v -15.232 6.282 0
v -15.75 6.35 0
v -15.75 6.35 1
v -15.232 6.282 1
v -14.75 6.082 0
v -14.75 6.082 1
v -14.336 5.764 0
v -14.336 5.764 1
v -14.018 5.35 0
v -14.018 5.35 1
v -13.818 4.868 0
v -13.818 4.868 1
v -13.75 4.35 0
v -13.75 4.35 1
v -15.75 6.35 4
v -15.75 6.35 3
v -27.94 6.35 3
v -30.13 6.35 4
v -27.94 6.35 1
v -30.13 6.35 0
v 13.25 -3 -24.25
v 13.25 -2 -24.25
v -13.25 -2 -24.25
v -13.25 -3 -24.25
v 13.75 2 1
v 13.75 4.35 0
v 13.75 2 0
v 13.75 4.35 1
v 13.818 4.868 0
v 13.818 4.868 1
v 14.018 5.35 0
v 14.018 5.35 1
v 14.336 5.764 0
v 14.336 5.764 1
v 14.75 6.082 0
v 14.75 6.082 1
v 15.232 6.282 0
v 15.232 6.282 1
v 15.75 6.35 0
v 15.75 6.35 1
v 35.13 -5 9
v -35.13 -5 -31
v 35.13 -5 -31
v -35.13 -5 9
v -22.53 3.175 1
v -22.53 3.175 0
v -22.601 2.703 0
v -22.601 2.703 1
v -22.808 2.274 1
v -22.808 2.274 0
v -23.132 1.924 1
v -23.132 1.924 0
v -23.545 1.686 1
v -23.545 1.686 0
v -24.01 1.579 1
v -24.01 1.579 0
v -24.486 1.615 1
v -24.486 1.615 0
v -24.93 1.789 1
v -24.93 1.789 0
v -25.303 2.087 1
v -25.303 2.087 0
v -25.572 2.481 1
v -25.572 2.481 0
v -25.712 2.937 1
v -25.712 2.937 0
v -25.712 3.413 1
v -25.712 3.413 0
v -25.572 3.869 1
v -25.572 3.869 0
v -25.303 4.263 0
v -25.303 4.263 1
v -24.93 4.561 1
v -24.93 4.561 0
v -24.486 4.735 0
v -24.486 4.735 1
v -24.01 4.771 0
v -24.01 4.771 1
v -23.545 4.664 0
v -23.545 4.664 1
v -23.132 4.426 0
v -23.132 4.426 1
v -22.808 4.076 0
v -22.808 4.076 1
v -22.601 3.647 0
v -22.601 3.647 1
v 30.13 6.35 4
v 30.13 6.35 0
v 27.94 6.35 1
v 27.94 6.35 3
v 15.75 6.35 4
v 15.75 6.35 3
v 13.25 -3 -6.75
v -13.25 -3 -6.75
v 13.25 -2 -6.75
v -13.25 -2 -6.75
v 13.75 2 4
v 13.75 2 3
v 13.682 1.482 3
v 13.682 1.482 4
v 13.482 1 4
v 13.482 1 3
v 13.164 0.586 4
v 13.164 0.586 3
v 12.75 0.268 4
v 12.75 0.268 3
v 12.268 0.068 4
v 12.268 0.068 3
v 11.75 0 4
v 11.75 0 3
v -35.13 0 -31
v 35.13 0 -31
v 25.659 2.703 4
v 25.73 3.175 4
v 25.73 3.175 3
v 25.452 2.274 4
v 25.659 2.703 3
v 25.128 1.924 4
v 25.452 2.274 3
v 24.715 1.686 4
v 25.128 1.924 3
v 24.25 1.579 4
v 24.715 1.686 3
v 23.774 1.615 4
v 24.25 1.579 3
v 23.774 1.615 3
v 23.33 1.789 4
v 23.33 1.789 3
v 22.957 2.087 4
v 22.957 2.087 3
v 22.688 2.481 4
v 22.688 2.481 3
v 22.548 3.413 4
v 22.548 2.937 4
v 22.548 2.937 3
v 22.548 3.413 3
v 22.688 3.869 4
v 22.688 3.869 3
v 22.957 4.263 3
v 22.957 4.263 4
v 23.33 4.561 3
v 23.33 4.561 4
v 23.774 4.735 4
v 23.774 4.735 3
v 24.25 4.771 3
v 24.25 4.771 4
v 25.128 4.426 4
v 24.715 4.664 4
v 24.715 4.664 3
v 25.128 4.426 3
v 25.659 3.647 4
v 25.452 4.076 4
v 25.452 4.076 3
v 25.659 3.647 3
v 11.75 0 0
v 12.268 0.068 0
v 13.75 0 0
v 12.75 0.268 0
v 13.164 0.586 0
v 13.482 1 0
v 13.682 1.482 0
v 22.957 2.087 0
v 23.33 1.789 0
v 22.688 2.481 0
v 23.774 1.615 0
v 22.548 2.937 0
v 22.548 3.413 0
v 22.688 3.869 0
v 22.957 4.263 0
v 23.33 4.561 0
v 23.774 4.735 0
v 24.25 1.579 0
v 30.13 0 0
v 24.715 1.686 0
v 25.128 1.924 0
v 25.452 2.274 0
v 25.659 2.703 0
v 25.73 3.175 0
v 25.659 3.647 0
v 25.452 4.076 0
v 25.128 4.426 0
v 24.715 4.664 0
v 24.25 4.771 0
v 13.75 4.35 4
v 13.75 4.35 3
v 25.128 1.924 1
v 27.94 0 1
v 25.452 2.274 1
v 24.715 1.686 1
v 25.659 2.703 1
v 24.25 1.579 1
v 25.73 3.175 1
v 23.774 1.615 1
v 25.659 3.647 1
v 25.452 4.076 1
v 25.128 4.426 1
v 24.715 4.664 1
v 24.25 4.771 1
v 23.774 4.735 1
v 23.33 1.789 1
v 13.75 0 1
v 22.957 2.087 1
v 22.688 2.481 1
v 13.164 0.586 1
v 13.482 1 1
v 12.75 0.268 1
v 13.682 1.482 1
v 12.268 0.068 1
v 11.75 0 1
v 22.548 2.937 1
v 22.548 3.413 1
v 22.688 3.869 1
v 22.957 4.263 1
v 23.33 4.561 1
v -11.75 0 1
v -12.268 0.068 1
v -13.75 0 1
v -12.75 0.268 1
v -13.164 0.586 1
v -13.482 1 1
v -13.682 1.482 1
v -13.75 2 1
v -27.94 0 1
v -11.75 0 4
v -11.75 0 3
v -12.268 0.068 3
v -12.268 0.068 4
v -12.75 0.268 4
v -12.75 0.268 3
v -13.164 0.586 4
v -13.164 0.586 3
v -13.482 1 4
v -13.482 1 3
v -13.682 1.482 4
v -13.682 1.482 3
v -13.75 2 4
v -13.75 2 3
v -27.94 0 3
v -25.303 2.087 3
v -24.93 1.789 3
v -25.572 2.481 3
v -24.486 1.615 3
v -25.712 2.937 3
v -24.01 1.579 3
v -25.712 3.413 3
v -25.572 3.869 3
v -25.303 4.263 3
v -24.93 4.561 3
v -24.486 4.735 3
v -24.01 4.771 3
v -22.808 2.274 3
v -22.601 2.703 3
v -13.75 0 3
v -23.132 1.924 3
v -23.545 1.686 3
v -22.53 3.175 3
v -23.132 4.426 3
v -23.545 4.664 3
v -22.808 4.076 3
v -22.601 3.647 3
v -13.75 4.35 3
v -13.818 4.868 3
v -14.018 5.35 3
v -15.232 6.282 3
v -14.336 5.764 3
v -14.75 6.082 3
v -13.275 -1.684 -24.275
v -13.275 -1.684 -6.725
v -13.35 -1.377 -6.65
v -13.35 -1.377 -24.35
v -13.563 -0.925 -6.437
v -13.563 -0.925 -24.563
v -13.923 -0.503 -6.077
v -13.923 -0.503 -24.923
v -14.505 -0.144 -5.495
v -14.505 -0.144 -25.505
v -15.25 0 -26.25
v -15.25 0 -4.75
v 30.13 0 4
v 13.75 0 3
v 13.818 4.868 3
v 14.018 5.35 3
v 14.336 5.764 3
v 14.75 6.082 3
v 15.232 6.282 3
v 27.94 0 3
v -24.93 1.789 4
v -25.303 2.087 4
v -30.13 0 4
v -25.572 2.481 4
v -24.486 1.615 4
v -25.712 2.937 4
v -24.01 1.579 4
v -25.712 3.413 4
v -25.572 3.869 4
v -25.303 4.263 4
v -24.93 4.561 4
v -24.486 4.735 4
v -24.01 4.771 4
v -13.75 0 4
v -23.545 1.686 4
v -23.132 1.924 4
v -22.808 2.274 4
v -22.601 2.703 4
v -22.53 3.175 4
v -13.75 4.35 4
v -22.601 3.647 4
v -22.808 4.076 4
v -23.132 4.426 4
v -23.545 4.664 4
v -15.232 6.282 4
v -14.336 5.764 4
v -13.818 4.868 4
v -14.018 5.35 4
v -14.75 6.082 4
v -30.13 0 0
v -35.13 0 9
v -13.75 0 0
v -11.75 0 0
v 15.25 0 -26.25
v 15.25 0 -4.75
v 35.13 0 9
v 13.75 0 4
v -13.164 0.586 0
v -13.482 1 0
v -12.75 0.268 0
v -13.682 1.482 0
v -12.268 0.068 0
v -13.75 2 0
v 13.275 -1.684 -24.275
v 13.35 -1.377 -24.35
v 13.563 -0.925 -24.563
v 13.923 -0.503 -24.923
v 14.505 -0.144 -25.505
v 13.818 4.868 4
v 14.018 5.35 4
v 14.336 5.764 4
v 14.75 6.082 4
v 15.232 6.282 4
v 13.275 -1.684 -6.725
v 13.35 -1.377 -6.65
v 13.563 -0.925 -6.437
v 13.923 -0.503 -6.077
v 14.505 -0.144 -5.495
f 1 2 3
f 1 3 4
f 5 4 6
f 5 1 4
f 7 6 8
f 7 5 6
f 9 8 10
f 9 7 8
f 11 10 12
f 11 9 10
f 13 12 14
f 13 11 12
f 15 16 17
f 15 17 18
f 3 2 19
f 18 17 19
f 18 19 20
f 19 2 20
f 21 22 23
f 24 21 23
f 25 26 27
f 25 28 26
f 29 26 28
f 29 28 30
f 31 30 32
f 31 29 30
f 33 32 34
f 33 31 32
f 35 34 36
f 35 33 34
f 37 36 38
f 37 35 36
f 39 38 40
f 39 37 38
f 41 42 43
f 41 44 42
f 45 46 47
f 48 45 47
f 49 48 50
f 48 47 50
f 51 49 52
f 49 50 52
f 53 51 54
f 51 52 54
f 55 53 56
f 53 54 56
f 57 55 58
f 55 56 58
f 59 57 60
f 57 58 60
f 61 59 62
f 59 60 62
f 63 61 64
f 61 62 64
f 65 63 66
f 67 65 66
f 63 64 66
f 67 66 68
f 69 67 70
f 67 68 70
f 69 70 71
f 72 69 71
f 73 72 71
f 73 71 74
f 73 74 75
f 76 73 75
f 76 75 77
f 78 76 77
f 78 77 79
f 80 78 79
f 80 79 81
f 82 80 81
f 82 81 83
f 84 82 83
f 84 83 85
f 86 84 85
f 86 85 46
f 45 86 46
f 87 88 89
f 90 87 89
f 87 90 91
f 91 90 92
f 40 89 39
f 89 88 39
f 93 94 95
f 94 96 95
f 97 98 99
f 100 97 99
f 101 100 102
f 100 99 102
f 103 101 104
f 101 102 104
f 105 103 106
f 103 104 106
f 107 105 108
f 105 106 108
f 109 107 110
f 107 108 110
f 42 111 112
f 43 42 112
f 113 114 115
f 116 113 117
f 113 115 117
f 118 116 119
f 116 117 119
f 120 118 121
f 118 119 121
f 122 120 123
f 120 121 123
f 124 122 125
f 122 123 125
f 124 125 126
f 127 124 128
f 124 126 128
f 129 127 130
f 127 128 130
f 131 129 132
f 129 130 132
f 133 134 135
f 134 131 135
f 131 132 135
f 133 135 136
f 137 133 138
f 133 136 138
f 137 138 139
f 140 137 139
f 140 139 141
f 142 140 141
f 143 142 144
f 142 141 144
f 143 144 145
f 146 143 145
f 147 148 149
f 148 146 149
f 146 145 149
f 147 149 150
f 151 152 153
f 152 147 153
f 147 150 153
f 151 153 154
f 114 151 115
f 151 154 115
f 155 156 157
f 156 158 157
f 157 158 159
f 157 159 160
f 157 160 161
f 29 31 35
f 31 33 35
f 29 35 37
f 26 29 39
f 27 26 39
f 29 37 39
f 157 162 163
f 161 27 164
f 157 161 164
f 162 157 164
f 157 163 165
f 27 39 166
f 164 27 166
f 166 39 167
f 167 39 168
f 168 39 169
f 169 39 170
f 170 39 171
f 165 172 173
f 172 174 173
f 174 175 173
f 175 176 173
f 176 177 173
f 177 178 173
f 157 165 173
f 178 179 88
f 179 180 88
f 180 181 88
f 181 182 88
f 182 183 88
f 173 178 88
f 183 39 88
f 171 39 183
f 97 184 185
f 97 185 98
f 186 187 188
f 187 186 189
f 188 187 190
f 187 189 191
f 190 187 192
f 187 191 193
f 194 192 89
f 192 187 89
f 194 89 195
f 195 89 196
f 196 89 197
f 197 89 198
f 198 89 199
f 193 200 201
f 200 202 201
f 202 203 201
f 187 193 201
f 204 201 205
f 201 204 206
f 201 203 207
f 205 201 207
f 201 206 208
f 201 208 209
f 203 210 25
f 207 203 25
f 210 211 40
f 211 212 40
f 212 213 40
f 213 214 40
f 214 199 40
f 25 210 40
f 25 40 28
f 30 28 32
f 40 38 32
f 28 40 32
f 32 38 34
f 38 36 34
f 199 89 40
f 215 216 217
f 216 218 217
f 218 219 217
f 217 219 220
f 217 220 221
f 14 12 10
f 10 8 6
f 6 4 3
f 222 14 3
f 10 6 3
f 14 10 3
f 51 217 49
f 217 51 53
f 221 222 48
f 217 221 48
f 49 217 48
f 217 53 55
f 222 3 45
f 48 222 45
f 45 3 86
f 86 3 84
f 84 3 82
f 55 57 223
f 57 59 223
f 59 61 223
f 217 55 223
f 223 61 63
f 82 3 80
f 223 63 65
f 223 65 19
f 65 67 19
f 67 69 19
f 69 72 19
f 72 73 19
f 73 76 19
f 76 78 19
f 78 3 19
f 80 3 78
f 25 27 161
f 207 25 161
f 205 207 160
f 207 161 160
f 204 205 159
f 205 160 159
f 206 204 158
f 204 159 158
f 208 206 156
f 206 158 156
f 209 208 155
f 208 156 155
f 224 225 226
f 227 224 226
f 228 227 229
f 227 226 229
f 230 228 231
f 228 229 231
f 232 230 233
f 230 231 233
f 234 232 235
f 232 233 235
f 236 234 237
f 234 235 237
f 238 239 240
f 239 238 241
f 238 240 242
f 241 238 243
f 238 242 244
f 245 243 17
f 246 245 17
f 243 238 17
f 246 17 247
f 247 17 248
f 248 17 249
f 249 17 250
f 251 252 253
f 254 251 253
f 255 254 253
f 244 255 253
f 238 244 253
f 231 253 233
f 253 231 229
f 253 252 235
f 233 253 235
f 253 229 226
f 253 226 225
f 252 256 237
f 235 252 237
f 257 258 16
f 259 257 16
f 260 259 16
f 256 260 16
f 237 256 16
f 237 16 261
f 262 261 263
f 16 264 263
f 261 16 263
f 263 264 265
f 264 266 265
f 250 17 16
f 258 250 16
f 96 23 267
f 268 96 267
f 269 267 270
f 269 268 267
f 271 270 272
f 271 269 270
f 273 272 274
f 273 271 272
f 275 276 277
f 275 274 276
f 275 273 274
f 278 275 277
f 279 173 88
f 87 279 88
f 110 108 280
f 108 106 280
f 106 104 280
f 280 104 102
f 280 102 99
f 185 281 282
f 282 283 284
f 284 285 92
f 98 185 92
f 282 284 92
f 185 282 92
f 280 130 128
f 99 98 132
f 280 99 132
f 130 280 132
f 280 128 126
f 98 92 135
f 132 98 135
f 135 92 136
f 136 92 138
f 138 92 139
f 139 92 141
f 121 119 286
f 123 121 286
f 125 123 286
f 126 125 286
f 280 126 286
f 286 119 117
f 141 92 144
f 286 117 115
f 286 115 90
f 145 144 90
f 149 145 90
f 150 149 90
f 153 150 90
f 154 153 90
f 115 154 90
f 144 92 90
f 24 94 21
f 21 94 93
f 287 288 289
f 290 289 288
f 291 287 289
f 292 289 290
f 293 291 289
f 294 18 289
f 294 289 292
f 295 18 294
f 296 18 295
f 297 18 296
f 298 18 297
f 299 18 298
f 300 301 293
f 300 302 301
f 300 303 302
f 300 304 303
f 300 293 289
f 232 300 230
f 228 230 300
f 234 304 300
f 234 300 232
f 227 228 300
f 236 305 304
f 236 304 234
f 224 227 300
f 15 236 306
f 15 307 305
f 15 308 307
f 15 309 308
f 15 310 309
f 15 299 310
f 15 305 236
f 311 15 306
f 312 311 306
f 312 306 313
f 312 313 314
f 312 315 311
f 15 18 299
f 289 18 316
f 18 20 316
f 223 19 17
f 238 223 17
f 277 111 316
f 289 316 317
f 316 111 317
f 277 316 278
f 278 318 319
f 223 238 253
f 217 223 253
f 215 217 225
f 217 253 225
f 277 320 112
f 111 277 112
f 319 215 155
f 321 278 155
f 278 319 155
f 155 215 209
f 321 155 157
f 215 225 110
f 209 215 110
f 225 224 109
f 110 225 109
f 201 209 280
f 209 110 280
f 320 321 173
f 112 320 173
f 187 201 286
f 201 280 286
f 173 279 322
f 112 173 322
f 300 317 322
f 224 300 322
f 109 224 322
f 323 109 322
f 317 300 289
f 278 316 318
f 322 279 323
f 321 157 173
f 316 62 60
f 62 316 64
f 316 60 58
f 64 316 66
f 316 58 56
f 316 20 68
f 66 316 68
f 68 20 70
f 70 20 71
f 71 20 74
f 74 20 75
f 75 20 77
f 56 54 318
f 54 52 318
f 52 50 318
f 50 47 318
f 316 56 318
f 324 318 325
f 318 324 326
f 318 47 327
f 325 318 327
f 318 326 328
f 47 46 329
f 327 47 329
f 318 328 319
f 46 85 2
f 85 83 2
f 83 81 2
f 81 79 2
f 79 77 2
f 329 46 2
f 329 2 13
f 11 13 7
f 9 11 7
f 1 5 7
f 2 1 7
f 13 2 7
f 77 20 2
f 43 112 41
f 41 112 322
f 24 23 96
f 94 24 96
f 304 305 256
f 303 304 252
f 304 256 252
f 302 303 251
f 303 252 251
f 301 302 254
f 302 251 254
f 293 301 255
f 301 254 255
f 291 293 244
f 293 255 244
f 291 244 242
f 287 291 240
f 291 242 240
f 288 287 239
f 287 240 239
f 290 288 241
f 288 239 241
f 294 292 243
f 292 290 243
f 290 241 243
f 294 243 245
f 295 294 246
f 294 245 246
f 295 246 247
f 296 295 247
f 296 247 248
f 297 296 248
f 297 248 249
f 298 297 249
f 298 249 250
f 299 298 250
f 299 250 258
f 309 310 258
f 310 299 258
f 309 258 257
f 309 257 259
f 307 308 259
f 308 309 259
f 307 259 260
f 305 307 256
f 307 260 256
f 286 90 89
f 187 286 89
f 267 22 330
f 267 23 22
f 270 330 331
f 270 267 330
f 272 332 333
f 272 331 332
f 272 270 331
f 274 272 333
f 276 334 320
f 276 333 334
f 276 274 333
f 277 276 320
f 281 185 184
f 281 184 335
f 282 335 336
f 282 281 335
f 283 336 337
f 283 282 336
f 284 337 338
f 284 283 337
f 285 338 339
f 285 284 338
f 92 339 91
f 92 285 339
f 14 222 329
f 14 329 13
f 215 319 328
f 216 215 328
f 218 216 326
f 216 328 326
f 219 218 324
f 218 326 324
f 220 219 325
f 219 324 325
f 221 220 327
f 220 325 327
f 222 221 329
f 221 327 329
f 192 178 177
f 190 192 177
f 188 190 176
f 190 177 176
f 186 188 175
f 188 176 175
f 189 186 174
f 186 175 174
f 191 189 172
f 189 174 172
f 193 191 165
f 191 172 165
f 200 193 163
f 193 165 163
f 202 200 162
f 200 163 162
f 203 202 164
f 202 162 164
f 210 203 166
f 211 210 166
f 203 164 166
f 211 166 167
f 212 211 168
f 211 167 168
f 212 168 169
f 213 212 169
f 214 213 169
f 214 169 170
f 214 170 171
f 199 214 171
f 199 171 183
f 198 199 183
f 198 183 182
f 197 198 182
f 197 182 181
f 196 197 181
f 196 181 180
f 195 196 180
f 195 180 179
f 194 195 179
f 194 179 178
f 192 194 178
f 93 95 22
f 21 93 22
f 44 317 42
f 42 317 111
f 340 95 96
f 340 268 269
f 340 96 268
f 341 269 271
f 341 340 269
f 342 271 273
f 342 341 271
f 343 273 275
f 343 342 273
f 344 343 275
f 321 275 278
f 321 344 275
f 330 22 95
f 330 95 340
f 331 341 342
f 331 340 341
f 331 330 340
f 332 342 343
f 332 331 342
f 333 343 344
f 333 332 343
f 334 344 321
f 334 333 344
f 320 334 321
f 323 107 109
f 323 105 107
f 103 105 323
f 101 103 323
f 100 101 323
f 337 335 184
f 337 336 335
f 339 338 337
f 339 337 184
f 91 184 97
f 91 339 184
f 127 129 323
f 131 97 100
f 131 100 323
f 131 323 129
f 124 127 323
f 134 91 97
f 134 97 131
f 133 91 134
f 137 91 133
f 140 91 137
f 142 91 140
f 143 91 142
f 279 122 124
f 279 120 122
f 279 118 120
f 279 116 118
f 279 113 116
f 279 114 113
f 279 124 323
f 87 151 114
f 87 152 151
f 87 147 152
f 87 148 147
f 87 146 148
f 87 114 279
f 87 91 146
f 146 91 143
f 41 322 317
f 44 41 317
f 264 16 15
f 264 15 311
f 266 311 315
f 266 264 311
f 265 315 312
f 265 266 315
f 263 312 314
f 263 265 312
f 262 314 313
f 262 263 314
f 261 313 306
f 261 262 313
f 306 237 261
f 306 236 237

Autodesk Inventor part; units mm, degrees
ref_plane "YZ Plane" through (0, 0, 0) normal (1, 0, 0) x (0, 1, 0)
ref_plane "XZ Plane" through (0, 0, 0) normal (0, 1, 0) x (-1, 0, 0)
ref_plane "XY Plane" through (0, 0, 0) normal (0, 0, 1) x (1, 0, 0)
sketch "Sketch1" plane through (0, 0, 0) normal (0, 0, 1) x (1, 0, 0)
  circle A0 centre (-24.13, 3.175) radius 1.6
  circle A1 centre (24.13, 3.175) radius 1.6
  line L0 (-30.13, 0) -> (30.13, 0)
  line L1 (30.13, 0) -> (30.13, 6.35)
  line L2 (30.13, 6.35) -> (-30.13, 6.35)
  line L3 (-30.13, 6.35) -> (-30.13, 0)
  line L4 (24.13, 3.175) -> (-24.13, 3.175) construction
  line L5 (-24.13, 3.175) -> (0, 0) construction
  line L6 (0, 0) -> (24.13, 3.175) construction
  line L7 (-30.13, 0) -> (-24.13, 3.175) construction
  line L8 (-30.13, 6.35) -> (-24.13, 3.175) construction
  line L9 (24.13, 3.175) -> (30.13, 6.35) construction
  dimension "d0" = 3.2
  dimension "d1" = 48.26
  dimension "d2" = 6
  dimension "d22" = 6.35
extrude "Extrusion1" add sketch "Sketch1" along normal blind 4
sketch "Sketch2" plane through (-30.13, 6.35, 0) normal (0, 1, 0) x (1, 0, 0)
  line L0 (2.19, -3) -> (58.07, -3)
  line L1 (58.07, -3) -> (58.07, -1)
  line L2 (58.07, -1) -> (2.19, -1)
  line L3 (2.19, -1) -> (2.19, -3)
  line L4 (58.07, -1) -> (60.26, 0) construction
  line L5 (0, -4) -> (60.26, -4) construction
  line L6 (58.07, -3) -> (60.26, -4) construction
  line L7 (0, -4) -> (2.19, -3) construction
  point P0 (30.13, 0)
  dimension "d6" = 55.88
  dimension "d7" = 2
extrude "Extrusion2" cut sketch "Sketch2" against normal blind 6.35
sketch "Sketch4" plane through (0, 0, 4) normal (0, 0, 1) x (1, 0, 0)
  line L0 (30.13, 6.35) -> (-30.13, 6.35) projected
  line L1 (-30.13, 0) -> (30.13, 0) projected
  line L2 (-13.75, 6.35) -> (13.75, 6.35)
  line L3 (13.75, 6.35) -> (13.75, 0)
  line L4 (13.75, 0) -> (-13.75, 0)
  line L5 (-13.75, 0) -> (-13.75, 6.35)
  line L6 (13.75, 6.35) -> (0, 0) construction
  line L7 (-13.75, 6.35) -> (0, 0) construction
  dimension "d18" = 27.5
extrude "Extrusion4" cut sketch "Sketch4" against normal through all
sketch "Sketch3" plane through (-30.13, 0, 0) normal (0, -1, 0) x (1, 0, 0)
  line L0 (65.26, 9) -> (-5, 9)
  line L1 (-5, 9) -> (-5, -31)
  line L2 (-5, -31) -> (65.26, -31)
  line L3 (65.26, -31) -> (65.26, 9)
  line L4 (0, 4) -> (60.26, 4) construction
  line L5 (0, 4) -> (-5, 9) construction
  line L6 (60.26, 4) -> (65.26, 9) construction
  line L7 (16.88, -6.75) -> (43.38, -6.75)
  line L8 (43.38, -6.75) -> (43.38, -24.25)
  line L9 (43.38, -24.25) -> (16.88, -24.25)
  line L10 (16.88, -24.25) -> (16.88, -6.75)
  line L11 (43.38, -6.75) -> (60.26, 0) construction
  line L12 (43.38, -24.25) -> (65.26, -31) construction
  line L13 (16.88, -6.75) -> (0, 0) construction
  line L14 (16.88, -24.25) -> (-5, -31) construction
  line L15 (16.88, -6.75) -> (16.88, 0) construction
  line L16 (16.88, -24.25) -> (16.88, -31) construction
  line L17 (16.38, 0) -> (0, 0) construction
  point P0 (30.13, 0)
  dimension "d12" = 5
  dimension "d13" = 5
  dimension "d14" = 40
  dimension "d23" = 17.5
  dimension "d24" = 26.5
extrude "Extrusion3" add sketch "Sketch3" along normal blind 5 contours L3 L2 L1 L0 | L7 L8 L9 L10
extrude "Extrusion5" cut sketch "Sketch3" along normal blind 3 contours L7 L8 L9 L10
fillet "Fillet1" radius 2 12 edges at (-13.75, 6.35, 3.5) (-13.75, 6.35, 0.5) (-13.75, 0, 0.5) (-13.75, 0, 3.5) (13.75, 0, 3.5) (13.75, 0, 0.5) (13.75, 6.35, 3.5) (13.75, 6.35, 0.5) (13.25, 0, -15.5) (0, 0, -24.25) (-13.25, 0, -15.5) (0, 0, -6.75)
properties part number "Holder"
